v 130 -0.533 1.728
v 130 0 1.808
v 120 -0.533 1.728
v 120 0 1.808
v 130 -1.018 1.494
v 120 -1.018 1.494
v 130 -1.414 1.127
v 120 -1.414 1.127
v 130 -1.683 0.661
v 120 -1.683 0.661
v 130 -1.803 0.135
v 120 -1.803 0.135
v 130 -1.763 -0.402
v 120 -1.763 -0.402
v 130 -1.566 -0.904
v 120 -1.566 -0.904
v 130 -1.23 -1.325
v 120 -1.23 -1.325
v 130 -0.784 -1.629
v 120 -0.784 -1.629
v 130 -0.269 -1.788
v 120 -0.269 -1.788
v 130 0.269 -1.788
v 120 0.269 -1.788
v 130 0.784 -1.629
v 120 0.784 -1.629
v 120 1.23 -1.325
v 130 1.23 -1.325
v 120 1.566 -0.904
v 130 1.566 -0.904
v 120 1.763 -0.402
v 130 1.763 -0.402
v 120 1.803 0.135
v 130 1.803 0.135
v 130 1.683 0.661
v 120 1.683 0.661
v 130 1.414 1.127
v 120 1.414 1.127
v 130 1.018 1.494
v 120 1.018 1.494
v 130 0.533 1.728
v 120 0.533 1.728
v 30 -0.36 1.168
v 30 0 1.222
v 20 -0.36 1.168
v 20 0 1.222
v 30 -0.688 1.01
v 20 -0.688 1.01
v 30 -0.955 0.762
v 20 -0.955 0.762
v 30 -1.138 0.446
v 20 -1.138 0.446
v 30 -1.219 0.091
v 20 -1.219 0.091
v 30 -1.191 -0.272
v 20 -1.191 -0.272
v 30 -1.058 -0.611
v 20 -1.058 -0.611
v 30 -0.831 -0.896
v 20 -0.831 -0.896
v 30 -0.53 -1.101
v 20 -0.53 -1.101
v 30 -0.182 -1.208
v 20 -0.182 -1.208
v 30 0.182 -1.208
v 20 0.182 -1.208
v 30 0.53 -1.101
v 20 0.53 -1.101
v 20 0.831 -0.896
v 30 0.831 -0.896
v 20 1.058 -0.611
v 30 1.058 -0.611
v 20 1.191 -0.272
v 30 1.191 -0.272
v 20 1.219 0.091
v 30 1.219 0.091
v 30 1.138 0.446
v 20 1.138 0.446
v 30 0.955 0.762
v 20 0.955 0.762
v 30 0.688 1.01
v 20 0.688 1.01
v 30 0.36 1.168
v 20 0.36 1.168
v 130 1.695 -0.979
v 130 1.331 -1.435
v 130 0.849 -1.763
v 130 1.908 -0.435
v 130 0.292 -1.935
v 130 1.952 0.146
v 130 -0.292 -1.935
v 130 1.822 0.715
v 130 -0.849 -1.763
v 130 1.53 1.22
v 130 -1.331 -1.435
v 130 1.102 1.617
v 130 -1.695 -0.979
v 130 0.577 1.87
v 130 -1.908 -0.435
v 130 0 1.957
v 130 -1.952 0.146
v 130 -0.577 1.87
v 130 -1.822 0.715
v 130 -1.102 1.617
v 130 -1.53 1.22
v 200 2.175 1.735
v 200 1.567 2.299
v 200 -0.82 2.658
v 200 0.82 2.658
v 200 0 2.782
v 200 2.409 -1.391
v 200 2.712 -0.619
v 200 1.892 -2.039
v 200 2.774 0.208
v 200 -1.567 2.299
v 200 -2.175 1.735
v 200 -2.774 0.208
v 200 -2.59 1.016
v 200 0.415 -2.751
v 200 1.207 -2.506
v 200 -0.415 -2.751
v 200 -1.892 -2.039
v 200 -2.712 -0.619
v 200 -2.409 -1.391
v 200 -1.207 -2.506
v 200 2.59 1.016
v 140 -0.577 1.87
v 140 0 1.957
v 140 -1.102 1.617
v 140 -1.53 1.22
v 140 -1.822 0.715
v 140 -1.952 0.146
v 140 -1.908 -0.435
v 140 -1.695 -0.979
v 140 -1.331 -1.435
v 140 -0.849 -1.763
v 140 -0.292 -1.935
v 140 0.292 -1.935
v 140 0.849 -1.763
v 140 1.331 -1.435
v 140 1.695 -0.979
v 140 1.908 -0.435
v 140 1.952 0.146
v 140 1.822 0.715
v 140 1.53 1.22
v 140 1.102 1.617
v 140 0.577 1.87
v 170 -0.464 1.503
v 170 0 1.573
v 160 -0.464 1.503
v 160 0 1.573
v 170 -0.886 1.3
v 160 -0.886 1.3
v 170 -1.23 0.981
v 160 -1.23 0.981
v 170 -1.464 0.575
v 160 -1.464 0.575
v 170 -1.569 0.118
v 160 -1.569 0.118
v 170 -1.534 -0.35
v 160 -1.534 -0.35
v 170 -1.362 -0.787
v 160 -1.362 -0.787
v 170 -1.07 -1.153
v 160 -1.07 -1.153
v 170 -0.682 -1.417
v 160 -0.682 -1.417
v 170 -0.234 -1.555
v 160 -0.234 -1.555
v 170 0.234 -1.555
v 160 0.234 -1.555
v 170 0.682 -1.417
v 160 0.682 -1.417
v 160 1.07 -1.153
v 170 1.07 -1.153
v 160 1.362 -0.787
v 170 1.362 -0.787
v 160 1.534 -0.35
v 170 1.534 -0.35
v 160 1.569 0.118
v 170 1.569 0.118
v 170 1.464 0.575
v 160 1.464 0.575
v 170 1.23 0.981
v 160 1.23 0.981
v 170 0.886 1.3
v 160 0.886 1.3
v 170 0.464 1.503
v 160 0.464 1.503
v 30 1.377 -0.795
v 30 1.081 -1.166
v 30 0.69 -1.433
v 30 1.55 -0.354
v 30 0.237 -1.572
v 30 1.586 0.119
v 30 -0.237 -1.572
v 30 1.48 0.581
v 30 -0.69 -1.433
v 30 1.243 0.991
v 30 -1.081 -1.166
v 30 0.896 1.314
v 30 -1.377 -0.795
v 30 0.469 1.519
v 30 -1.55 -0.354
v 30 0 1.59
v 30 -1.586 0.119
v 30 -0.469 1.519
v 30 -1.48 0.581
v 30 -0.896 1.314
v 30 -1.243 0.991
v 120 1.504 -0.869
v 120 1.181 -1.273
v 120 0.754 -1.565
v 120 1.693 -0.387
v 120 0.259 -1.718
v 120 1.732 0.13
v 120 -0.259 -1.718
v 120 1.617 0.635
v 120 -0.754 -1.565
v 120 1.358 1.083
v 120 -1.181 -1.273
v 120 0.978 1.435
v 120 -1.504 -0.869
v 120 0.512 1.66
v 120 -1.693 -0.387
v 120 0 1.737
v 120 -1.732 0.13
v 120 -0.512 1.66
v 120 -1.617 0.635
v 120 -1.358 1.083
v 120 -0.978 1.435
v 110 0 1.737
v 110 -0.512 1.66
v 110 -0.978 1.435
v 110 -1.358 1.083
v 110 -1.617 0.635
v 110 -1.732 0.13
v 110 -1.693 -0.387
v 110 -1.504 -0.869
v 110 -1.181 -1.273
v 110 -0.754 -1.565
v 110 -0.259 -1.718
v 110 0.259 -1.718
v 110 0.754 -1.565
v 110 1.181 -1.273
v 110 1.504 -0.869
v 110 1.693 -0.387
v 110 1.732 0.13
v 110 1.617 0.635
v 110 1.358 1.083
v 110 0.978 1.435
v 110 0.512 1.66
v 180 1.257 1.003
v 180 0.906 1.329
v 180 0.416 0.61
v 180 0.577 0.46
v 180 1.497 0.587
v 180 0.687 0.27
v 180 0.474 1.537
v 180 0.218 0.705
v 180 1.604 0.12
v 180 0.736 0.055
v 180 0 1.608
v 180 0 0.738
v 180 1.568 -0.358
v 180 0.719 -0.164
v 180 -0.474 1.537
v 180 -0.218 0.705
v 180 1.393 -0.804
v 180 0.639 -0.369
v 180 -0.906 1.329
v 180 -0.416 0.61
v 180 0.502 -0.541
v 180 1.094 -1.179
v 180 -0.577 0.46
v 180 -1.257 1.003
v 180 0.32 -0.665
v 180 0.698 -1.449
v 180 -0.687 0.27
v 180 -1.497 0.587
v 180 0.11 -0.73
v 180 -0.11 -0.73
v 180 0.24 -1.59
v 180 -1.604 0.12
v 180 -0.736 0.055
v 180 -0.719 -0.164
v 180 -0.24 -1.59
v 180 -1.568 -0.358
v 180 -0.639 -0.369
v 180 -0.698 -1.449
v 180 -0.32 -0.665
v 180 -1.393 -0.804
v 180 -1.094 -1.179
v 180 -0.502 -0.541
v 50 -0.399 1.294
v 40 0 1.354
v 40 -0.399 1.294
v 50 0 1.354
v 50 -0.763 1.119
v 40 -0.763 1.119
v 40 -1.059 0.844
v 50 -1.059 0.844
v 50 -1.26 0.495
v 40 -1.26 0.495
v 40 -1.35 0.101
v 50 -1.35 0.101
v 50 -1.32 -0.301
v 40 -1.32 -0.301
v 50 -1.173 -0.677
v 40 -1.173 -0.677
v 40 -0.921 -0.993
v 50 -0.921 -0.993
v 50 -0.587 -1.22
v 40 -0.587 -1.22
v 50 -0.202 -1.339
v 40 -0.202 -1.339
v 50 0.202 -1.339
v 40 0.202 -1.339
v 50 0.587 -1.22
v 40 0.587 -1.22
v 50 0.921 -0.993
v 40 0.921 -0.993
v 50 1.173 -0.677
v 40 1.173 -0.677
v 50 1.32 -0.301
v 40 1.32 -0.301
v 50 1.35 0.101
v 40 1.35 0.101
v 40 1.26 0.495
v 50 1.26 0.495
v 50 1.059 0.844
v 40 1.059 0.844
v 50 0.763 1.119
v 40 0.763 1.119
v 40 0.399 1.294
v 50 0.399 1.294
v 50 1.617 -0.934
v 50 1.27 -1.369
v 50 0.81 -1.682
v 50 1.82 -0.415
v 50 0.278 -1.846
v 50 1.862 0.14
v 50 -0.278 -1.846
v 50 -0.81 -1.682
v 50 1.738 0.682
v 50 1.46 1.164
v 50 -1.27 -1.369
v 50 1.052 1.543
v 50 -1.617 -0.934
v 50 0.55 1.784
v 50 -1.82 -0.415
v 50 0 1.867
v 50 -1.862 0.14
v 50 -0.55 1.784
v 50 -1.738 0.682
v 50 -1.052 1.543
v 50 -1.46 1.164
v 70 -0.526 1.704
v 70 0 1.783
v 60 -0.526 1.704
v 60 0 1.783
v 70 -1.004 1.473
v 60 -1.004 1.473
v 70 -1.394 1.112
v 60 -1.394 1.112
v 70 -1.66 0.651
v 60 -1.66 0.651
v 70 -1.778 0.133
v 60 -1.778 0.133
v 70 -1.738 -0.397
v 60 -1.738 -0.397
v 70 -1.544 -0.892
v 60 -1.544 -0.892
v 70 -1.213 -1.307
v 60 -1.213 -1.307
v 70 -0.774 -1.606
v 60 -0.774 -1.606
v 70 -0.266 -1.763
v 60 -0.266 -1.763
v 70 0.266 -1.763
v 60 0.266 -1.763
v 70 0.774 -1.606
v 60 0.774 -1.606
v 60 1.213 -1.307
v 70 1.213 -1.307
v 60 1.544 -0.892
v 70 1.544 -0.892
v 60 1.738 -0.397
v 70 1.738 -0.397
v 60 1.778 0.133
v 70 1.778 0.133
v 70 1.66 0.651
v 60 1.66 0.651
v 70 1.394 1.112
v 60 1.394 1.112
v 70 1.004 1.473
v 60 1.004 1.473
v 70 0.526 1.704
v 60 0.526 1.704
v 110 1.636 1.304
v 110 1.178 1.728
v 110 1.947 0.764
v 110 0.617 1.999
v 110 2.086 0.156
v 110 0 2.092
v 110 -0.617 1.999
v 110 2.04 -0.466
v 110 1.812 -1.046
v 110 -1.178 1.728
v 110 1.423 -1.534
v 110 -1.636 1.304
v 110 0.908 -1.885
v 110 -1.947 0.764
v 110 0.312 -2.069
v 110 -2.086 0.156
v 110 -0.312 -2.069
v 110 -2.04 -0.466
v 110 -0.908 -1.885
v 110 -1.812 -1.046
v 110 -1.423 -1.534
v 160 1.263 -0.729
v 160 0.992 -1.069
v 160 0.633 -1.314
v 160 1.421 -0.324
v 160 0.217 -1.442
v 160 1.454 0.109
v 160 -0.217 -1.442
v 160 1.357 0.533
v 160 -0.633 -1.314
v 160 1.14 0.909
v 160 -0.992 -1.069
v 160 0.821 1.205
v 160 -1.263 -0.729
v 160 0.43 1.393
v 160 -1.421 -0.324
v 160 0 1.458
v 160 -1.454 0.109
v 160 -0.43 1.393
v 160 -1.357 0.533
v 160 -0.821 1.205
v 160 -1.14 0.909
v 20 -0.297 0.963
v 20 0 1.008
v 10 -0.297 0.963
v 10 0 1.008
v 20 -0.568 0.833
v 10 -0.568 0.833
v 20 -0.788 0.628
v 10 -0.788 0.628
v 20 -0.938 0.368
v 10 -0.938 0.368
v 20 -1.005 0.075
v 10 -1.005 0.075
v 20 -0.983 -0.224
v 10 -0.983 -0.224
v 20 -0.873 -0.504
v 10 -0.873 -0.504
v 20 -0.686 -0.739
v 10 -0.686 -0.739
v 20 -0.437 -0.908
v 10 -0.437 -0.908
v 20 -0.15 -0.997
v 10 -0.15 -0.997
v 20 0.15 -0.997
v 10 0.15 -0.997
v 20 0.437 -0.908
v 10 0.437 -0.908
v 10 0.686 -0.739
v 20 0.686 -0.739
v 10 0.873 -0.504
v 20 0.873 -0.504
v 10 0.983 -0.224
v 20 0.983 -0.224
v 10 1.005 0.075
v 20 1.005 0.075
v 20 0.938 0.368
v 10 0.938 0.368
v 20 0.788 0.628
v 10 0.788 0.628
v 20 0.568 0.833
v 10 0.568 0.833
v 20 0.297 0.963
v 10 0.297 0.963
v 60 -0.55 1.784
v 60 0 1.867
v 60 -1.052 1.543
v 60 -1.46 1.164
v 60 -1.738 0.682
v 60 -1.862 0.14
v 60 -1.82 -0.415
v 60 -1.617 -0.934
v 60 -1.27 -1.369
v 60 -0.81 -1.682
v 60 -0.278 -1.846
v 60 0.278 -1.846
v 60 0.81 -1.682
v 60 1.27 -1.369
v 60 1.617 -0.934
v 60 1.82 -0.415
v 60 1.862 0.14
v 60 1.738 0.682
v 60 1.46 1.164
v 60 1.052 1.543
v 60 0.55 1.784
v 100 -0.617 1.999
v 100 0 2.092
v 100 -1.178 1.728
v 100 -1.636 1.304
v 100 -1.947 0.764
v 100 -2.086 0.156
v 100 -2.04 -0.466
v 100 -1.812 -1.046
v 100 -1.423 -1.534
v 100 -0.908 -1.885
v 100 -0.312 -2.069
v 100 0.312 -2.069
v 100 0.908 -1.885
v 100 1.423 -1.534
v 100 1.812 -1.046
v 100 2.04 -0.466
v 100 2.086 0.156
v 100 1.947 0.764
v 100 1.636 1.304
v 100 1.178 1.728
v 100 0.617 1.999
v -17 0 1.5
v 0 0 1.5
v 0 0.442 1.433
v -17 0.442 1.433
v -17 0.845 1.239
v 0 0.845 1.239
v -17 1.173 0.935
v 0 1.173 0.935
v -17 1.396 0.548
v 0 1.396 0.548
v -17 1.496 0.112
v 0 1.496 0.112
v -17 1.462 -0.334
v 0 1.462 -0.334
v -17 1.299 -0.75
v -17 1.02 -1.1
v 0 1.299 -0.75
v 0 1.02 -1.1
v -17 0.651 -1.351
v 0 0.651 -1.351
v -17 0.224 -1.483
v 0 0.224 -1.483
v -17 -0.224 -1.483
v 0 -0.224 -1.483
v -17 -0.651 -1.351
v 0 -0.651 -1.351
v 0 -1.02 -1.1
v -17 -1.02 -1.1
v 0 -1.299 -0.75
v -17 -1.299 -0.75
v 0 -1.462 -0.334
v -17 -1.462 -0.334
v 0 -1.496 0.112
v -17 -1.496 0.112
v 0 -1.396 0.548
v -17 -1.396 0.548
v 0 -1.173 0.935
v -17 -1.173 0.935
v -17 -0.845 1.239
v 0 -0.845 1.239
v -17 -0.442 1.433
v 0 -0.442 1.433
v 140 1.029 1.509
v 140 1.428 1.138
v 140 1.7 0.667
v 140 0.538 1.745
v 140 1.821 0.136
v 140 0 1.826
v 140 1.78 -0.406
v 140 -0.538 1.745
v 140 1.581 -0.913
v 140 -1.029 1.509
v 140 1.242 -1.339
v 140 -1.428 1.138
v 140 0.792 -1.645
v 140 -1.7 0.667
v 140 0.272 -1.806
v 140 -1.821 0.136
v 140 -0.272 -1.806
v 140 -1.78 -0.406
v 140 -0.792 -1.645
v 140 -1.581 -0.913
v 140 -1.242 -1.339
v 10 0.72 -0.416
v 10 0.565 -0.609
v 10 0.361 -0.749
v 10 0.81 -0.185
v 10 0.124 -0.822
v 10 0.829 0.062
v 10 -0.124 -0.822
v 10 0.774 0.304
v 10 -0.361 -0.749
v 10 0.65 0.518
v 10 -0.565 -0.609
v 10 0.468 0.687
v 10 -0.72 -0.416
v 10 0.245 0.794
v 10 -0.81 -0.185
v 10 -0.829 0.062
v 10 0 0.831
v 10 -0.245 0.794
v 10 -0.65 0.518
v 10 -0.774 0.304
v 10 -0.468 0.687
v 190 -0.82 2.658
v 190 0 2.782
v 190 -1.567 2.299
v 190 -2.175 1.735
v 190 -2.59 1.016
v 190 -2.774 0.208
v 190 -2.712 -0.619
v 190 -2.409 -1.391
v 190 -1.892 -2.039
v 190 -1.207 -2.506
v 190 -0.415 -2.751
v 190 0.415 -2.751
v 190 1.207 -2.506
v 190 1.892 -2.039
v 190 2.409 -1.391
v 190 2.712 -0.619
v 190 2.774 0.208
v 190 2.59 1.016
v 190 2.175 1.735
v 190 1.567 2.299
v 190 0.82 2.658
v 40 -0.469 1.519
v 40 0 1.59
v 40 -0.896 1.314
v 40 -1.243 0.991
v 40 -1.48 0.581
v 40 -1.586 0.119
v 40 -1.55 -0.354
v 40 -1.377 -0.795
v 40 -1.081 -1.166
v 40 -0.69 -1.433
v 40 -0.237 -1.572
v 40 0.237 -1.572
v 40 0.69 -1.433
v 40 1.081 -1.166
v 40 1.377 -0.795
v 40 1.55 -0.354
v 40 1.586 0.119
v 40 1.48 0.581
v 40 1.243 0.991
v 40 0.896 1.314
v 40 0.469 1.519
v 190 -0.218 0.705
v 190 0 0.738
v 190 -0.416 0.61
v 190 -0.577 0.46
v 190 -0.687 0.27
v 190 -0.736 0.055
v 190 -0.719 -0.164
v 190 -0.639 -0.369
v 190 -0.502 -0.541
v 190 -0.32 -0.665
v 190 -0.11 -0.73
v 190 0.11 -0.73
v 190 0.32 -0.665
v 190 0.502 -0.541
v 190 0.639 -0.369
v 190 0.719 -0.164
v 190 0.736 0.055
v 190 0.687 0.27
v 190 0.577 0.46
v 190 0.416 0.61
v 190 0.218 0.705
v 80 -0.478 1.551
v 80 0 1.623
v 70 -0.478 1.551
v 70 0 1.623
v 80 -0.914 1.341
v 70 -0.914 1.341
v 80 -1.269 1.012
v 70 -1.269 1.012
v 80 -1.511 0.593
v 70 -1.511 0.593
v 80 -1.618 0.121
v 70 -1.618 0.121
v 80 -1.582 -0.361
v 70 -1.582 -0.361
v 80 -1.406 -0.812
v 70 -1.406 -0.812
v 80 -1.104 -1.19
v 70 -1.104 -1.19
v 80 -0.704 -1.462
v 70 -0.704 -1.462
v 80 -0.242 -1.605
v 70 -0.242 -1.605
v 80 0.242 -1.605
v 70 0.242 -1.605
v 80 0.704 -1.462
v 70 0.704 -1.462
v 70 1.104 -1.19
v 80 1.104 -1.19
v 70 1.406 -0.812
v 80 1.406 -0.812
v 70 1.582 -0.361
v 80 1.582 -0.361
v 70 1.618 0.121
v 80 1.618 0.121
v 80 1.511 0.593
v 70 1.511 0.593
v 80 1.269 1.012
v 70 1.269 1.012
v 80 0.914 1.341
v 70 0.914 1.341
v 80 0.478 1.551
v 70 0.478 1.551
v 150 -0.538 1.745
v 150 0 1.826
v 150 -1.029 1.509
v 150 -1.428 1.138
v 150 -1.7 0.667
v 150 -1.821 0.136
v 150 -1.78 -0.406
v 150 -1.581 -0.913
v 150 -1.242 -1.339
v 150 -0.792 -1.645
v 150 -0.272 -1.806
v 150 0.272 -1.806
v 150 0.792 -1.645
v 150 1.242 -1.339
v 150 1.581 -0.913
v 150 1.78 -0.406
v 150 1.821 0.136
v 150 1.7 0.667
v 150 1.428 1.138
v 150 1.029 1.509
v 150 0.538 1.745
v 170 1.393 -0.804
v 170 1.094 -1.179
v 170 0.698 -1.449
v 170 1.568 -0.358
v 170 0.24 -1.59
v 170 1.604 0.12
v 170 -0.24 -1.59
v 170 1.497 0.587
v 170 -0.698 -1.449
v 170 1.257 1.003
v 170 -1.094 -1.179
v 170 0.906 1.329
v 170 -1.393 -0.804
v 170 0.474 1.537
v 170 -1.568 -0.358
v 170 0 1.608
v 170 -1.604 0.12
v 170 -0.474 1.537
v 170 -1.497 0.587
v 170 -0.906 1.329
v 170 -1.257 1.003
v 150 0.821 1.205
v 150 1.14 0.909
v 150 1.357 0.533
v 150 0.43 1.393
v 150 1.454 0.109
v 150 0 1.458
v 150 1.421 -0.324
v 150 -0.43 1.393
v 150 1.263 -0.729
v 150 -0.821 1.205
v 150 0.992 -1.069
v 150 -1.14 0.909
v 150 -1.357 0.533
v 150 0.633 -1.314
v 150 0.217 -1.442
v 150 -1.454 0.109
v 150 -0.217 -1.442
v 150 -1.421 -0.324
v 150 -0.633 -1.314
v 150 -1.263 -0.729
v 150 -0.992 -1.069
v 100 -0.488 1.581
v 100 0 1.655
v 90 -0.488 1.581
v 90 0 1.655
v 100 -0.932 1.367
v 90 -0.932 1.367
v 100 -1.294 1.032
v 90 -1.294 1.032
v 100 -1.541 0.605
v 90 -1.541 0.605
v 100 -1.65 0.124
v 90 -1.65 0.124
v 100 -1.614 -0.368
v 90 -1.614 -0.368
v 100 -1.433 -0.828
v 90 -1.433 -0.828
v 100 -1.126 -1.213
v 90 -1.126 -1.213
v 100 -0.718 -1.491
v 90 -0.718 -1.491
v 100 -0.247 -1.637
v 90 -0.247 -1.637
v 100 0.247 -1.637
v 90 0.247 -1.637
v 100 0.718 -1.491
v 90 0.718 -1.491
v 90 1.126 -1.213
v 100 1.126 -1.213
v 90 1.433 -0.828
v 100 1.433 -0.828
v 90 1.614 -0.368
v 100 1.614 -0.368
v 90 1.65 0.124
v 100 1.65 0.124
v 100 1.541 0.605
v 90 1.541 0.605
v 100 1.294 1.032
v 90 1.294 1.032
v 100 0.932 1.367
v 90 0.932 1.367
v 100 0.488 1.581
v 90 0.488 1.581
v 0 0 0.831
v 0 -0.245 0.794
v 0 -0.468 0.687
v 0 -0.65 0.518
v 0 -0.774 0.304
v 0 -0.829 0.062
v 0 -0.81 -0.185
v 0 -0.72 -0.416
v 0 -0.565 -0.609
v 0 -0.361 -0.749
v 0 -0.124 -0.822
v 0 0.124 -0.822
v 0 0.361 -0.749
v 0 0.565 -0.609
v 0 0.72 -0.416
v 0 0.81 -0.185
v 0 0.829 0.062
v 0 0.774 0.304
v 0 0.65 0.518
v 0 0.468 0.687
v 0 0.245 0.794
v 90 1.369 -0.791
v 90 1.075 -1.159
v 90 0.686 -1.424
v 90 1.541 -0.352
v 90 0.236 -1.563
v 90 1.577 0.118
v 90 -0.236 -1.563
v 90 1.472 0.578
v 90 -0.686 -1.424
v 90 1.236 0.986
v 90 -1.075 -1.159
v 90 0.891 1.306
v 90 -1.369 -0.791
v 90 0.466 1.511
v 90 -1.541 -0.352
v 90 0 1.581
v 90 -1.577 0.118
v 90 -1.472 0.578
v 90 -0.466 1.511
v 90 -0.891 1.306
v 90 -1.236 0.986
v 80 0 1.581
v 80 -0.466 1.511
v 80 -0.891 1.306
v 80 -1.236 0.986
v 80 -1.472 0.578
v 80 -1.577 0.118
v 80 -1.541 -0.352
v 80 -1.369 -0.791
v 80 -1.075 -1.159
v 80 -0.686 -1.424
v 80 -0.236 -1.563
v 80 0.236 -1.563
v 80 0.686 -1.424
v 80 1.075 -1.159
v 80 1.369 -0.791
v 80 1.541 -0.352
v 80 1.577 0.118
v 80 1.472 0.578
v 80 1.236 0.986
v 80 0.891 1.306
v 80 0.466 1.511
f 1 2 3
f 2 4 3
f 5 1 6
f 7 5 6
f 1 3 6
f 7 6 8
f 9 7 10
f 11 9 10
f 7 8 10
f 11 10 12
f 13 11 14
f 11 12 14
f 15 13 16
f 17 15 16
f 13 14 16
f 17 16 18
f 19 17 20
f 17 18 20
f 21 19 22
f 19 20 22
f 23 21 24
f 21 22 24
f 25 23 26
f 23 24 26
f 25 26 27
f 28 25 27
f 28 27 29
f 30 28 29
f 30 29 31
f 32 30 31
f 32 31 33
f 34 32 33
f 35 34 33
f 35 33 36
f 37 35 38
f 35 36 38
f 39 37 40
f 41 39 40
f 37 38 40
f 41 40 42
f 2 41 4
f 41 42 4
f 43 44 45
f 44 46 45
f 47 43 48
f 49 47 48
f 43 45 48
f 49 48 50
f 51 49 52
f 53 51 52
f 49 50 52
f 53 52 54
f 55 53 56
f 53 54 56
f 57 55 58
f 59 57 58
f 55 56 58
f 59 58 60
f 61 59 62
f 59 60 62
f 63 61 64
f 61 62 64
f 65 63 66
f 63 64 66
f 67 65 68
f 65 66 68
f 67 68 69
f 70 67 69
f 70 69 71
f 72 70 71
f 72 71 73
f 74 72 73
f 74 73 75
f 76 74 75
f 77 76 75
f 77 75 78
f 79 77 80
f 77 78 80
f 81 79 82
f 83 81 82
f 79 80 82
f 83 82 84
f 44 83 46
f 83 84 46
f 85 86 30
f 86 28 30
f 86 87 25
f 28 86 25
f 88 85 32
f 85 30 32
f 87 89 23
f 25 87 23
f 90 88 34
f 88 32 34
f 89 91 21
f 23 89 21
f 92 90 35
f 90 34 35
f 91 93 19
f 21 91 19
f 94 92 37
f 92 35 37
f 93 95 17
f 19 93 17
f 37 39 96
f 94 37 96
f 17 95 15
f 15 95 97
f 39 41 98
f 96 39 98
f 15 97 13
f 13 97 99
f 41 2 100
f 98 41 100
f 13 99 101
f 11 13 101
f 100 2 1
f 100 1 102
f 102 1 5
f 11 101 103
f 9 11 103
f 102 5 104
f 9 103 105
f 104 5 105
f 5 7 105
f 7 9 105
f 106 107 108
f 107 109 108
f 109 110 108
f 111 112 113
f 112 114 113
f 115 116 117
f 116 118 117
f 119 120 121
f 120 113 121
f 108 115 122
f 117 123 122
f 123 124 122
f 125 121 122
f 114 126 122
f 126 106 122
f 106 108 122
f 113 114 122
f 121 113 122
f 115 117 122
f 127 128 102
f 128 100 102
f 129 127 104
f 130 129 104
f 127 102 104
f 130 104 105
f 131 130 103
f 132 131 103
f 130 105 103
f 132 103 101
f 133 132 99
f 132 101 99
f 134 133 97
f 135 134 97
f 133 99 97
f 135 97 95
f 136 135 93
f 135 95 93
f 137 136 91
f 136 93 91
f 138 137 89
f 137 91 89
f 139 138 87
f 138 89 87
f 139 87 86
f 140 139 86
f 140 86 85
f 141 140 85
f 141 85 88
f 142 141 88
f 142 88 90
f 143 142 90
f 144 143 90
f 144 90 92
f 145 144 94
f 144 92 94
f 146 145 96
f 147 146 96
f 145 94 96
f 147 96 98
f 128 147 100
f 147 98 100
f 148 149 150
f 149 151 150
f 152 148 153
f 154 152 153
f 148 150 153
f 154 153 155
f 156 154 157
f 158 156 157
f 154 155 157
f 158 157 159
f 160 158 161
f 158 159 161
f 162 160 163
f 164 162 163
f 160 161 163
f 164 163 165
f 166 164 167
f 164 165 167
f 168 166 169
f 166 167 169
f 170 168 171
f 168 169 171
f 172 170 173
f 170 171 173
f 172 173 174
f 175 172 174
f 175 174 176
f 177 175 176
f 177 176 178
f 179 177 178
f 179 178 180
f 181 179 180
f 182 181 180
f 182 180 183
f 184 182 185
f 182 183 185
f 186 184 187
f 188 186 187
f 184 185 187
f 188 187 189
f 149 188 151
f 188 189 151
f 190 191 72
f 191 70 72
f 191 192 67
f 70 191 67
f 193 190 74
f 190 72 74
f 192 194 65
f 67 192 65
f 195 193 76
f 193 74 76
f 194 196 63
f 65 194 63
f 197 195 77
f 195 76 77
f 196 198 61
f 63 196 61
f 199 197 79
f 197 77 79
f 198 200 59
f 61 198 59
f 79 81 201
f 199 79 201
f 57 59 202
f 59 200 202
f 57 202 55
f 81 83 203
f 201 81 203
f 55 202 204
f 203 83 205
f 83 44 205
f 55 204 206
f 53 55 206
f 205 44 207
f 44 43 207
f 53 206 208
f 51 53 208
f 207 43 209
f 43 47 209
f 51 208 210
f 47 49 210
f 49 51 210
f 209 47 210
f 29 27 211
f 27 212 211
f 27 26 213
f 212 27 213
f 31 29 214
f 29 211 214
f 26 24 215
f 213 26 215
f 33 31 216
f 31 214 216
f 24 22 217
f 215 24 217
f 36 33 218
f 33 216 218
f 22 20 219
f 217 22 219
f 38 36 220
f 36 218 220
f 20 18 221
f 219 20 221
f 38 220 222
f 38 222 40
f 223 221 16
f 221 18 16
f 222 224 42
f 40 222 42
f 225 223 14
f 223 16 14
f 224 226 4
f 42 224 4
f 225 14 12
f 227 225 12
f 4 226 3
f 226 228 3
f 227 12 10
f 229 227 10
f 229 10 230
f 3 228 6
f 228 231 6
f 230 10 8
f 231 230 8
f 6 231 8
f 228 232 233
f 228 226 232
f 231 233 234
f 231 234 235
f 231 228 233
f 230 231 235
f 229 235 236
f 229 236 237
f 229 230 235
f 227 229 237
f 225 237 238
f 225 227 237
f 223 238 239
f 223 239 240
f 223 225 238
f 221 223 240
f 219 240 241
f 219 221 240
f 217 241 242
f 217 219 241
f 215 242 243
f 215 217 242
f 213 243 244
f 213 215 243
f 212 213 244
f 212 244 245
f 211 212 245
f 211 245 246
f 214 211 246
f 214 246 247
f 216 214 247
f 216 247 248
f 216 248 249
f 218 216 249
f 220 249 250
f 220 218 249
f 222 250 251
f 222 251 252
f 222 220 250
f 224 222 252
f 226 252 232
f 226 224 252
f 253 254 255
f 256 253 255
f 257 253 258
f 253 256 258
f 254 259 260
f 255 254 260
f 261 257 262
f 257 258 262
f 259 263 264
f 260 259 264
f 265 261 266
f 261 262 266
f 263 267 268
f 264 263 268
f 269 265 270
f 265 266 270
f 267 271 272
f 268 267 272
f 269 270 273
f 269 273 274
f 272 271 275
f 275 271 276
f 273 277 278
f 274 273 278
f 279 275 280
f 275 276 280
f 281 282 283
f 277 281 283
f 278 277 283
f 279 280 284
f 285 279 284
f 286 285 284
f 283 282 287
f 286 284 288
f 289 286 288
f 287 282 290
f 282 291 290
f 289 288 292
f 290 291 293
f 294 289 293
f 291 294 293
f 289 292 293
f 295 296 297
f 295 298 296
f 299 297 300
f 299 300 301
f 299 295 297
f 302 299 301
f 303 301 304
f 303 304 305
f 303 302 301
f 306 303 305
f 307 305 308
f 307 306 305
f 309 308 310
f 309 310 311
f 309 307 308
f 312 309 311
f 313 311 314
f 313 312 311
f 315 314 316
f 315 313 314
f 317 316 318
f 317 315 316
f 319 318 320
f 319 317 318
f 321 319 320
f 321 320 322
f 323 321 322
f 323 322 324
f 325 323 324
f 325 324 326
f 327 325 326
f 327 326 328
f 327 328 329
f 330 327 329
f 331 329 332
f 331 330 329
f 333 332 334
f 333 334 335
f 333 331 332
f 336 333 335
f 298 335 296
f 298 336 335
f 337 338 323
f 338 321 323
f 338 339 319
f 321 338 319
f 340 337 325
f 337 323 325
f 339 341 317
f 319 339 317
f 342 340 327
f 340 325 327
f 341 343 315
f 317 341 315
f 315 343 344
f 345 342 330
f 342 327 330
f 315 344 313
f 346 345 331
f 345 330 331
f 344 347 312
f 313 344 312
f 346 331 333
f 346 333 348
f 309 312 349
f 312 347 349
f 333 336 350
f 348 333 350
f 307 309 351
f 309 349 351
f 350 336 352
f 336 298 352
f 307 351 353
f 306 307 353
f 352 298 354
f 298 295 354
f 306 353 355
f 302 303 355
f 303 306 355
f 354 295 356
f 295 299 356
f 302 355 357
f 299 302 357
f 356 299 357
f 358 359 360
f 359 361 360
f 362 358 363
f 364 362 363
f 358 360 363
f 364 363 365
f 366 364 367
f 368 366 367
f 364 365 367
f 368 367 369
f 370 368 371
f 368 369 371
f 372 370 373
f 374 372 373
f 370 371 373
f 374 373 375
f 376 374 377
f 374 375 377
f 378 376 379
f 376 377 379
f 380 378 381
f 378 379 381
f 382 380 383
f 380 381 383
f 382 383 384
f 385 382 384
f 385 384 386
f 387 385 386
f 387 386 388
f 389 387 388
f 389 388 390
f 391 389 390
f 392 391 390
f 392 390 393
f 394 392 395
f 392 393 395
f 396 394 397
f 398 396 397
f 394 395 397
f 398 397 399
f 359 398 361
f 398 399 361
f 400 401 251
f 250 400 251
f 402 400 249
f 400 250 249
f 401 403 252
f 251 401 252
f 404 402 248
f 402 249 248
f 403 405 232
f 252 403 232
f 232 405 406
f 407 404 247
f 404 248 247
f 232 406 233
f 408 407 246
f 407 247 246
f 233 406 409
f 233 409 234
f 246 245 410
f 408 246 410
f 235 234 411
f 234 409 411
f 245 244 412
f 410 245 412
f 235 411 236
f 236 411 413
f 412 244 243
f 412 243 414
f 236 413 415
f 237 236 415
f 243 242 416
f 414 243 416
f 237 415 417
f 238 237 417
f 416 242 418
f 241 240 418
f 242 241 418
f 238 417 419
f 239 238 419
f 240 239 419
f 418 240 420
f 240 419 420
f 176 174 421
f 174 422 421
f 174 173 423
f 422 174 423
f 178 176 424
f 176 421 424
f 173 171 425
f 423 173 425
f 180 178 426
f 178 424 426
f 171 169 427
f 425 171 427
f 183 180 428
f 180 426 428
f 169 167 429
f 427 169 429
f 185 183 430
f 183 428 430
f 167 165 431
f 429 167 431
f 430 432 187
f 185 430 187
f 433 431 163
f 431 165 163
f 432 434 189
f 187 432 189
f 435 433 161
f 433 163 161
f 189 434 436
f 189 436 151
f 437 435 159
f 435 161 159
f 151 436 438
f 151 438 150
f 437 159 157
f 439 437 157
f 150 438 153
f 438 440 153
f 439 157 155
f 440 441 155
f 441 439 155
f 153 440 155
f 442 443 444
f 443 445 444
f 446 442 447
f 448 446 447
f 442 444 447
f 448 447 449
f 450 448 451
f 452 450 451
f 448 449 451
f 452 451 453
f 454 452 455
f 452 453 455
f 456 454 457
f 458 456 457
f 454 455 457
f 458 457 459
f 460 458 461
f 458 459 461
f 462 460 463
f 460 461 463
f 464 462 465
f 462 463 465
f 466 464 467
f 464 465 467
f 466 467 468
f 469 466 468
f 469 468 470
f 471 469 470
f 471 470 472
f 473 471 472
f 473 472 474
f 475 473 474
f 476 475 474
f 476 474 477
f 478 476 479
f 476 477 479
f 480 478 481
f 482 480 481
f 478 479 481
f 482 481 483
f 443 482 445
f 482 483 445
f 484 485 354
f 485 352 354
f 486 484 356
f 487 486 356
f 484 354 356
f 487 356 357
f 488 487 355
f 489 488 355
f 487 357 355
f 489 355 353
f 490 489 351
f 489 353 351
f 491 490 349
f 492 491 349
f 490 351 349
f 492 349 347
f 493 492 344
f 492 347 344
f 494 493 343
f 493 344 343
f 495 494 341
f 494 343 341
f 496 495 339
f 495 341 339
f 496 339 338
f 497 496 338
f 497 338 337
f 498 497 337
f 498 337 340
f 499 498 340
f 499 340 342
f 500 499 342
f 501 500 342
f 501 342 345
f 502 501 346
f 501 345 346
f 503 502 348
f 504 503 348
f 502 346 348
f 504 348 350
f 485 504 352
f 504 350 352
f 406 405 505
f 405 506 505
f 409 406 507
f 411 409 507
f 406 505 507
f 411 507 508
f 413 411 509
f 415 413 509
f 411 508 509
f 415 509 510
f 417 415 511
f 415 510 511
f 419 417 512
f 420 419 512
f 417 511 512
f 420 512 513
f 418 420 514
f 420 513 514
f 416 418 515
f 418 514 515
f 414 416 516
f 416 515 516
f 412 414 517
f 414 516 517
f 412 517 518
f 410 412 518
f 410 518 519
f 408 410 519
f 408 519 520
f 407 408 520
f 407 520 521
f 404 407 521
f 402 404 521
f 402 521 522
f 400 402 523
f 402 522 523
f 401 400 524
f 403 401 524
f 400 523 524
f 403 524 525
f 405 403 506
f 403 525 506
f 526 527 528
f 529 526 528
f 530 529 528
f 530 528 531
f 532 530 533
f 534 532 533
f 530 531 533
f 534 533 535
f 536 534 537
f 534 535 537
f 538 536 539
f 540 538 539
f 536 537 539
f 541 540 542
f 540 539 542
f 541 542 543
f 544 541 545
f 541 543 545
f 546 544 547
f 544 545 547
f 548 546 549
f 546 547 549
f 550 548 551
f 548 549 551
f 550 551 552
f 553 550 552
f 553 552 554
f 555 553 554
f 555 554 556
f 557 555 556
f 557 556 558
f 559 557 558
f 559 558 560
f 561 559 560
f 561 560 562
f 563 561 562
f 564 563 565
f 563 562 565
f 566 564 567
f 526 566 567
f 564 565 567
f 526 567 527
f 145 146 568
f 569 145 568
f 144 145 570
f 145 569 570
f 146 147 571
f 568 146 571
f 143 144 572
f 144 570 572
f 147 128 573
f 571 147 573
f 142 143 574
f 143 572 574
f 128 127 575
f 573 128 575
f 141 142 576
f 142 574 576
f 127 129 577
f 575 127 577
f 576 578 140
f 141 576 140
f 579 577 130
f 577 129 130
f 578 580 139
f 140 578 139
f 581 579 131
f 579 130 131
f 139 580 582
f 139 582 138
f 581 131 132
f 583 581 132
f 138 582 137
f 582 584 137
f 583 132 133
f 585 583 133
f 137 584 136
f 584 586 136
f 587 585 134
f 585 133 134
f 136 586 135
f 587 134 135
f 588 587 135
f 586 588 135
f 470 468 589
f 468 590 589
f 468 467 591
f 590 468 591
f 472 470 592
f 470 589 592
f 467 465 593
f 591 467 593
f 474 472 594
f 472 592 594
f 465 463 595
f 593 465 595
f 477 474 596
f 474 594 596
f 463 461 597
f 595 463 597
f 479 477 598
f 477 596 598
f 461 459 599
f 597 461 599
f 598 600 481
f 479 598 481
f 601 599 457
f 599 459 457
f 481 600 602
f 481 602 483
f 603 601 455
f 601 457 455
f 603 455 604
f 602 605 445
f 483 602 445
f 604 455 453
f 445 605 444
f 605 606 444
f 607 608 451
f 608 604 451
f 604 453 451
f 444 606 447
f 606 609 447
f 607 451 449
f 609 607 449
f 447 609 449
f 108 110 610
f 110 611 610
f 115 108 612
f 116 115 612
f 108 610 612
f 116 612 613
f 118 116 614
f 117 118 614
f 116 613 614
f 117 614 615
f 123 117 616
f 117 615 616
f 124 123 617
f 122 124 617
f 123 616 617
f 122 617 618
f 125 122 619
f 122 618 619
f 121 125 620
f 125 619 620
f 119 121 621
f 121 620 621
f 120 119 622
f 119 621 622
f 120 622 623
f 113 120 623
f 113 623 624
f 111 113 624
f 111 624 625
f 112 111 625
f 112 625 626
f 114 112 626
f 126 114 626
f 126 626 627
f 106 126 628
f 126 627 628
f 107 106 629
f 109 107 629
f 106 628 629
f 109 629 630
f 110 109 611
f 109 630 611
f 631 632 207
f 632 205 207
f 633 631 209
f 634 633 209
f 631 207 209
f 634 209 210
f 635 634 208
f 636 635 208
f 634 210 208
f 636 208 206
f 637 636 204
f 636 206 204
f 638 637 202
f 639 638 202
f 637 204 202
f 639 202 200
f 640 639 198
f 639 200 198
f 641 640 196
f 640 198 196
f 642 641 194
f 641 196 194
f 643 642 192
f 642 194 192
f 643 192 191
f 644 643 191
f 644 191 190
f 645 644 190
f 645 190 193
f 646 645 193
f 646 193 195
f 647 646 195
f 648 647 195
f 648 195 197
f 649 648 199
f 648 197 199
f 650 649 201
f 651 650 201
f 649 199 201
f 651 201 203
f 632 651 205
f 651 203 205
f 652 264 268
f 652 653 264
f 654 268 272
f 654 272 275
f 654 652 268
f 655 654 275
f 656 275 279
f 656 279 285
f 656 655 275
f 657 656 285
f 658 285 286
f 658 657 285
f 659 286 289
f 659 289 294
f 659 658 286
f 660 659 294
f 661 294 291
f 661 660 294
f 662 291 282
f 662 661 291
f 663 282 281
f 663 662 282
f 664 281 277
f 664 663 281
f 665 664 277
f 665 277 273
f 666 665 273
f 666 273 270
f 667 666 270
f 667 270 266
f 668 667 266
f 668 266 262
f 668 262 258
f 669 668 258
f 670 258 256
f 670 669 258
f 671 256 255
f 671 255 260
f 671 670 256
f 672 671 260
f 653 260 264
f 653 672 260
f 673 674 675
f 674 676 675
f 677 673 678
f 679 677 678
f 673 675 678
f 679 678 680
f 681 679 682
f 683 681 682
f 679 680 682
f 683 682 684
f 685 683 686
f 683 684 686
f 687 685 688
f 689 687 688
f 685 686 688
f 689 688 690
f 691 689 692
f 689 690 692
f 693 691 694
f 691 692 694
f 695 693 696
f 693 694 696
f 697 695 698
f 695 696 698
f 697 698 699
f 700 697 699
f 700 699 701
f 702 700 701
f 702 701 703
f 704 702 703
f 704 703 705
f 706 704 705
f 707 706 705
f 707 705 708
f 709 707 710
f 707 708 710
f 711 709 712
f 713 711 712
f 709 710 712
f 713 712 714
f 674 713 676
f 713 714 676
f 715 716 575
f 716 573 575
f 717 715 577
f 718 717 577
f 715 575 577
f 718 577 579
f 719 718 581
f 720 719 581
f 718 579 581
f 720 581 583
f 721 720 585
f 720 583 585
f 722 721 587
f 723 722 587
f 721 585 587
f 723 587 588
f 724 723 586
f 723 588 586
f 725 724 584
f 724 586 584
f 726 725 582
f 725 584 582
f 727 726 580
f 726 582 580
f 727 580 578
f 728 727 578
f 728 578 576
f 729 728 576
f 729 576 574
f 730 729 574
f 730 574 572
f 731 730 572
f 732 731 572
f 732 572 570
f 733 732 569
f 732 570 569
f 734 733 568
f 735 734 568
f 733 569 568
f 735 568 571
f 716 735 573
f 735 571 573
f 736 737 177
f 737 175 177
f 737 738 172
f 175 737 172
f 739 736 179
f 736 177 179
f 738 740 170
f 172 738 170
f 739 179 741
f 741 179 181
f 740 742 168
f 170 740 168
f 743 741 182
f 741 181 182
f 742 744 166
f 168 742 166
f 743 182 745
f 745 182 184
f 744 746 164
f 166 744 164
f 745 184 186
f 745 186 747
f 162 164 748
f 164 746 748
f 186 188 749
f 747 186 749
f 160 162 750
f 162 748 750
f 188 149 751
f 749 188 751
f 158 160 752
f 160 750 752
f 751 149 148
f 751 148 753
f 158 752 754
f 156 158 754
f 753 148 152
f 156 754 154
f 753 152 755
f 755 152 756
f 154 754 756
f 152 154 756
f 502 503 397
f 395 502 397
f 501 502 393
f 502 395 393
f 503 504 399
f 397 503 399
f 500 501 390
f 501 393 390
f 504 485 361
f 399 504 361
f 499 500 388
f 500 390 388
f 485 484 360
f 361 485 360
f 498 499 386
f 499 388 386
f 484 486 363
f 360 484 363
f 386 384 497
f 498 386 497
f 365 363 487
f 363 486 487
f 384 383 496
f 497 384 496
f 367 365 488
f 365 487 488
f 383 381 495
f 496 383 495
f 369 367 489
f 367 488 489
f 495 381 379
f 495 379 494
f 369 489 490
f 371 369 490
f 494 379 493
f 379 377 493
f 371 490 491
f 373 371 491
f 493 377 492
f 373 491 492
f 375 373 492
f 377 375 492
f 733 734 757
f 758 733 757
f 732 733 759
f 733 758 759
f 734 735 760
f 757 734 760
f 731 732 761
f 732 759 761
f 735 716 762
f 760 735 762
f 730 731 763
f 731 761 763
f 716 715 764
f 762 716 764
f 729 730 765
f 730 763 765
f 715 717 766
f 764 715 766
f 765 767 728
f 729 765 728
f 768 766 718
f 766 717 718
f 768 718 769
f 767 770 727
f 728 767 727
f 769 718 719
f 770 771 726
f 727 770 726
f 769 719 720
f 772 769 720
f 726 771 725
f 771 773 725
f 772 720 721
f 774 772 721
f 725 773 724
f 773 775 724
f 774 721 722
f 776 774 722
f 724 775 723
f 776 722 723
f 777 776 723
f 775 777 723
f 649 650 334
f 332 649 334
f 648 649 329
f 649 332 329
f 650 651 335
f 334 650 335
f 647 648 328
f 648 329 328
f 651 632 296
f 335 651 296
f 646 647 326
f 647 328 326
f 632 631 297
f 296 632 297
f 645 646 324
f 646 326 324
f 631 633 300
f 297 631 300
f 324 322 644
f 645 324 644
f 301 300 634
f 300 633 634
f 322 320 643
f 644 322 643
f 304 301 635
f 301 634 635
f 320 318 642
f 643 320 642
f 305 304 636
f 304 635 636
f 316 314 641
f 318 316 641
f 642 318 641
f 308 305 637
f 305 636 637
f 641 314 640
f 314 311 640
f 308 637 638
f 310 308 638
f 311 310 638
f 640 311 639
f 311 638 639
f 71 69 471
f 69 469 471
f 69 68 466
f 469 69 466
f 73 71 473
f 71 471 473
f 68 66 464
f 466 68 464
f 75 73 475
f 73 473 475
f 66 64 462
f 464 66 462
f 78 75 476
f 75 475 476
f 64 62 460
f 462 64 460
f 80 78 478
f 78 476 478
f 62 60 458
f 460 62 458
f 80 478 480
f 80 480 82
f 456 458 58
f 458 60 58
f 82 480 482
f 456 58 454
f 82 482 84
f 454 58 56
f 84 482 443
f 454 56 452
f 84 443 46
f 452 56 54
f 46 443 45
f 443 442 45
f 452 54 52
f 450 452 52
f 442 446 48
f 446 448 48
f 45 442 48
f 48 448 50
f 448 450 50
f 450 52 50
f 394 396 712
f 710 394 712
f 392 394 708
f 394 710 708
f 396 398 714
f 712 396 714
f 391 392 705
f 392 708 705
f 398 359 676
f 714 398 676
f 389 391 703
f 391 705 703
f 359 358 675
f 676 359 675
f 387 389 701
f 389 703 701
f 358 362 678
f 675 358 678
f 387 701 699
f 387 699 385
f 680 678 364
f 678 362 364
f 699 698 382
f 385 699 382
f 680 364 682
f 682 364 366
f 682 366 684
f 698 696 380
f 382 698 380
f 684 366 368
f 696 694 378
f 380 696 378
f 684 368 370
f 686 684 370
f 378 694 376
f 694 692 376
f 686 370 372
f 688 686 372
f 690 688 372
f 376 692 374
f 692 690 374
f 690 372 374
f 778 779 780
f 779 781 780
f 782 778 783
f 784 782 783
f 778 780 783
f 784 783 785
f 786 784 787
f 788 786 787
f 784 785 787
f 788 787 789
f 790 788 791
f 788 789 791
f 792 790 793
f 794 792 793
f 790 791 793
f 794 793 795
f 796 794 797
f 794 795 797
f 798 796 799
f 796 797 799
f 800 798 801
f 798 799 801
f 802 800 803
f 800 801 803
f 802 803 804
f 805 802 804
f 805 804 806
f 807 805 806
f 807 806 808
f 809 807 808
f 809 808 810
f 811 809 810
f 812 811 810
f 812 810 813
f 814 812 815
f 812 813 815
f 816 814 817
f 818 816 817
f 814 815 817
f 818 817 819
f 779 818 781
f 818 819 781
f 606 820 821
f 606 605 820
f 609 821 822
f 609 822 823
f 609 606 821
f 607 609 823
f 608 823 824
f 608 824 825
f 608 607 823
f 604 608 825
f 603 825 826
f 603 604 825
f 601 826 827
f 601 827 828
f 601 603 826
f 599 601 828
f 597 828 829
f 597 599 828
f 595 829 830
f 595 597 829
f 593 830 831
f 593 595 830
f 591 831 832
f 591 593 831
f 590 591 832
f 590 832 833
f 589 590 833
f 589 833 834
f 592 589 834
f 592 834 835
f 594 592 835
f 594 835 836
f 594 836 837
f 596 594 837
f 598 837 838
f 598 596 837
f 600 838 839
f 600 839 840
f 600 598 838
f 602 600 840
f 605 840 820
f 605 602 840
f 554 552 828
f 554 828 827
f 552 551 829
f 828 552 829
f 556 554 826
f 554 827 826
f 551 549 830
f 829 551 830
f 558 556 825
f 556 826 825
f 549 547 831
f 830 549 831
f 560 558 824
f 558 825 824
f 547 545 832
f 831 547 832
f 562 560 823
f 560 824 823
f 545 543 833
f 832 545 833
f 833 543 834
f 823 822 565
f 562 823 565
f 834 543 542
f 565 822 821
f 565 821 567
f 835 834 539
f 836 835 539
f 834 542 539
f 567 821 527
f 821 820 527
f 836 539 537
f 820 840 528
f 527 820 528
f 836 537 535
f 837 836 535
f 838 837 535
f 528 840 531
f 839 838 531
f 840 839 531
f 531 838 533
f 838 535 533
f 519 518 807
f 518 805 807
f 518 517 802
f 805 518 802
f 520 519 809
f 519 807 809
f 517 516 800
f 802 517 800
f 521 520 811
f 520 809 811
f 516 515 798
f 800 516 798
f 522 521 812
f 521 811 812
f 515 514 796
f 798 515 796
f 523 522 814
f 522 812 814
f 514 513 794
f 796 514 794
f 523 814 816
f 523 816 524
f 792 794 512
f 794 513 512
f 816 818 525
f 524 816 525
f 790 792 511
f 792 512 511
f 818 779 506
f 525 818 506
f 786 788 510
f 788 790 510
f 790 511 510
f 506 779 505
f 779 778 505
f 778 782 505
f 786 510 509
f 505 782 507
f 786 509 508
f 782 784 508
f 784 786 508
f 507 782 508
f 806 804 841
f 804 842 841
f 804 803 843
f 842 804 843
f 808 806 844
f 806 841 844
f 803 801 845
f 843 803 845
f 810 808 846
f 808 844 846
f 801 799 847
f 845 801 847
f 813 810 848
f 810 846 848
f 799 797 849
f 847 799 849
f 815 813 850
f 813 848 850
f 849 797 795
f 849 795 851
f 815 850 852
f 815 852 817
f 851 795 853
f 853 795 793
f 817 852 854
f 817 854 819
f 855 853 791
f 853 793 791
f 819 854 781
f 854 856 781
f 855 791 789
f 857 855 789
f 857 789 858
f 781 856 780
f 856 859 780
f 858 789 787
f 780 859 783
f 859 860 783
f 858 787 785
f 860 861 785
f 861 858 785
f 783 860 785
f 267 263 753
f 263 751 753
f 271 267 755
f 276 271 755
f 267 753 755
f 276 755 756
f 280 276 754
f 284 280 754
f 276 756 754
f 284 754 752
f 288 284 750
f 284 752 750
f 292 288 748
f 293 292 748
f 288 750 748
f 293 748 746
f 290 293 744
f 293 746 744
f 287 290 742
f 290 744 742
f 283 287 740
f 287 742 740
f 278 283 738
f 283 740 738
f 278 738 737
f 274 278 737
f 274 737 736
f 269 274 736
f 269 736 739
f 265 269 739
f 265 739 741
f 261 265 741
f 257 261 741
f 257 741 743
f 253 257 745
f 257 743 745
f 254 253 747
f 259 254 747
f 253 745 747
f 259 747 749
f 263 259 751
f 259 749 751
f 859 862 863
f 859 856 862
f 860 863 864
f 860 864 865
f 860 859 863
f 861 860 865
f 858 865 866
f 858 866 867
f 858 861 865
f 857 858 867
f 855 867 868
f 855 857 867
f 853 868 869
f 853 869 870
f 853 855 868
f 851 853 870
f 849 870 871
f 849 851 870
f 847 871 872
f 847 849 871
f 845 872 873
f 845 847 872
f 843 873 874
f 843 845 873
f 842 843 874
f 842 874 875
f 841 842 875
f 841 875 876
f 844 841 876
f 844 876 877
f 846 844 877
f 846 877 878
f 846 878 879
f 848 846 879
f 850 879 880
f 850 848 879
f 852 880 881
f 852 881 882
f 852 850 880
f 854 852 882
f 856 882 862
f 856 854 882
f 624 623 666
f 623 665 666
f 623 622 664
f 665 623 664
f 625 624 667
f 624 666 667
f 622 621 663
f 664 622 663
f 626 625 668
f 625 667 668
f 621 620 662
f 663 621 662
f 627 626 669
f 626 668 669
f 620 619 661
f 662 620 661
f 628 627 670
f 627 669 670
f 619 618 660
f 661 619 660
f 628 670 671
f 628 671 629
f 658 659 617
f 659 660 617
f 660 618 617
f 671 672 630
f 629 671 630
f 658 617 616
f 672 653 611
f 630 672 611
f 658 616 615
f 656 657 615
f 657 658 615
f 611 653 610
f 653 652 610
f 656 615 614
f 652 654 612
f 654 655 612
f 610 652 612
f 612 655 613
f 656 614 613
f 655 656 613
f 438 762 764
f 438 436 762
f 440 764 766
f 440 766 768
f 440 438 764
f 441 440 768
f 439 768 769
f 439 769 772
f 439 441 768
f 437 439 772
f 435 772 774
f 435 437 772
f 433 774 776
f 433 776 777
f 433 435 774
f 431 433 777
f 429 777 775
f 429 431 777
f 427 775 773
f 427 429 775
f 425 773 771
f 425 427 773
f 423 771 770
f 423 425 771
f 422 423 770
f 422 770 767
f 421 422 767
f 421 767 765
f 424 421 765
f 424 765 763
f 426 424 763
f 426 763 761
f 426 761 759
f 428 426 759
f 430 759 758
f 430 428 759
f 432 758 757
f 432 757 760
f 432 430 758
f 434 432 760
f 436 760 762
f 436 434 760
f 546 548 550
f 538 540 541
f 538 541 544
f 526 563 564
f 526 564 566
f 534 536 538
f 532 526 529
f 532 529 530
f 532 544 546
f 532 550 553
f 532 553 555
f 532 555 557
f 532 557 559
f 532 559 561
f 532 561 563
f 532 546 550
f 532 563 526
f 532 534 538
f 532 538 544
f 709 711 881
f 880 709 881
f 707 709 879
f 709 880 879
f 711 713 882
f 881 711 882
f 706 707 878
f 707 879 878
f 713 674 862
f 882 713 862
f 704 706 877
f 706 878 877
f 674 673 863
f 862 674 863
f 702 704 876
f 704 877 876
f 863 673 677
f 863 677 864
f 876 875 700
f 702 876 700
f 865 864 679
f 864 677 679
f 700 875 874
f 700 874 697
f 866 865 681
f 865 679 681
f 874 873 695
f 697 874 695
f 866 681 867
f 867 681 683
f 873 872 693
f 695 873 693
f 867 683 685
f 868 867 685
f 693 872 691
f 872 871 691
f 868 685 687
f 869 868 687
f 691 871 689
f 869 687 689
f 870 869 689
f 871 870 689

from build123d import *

# Parameters (mm, degrees)
SKETCH1_W           = 10
SKETCH1_H           = 0.831
SKETCH1_H_2         = 1.354
SKETCH1_H_3         = 1.581
SKETCH1_H_4         = 1.737
SKETCH1_H_5         = 1.458
SKETCH1_H_6         = 0.738
SKETCH2_R           = 1.5
BOSS_EXTRUDE1_DEPTH = 17


with BuildPart() as part:
    # Sketch1 → Revolve1 (revolve)
    with BuildSketch(Plane.XY, mode=Mode.PRIVATE) as revolve1_sk:
        with Locations((5, 0.4155)):
            Rectangle(SKETCH1_W, SKETCH1_H)
        Polygon((10, 0.831), (10, 0), (20, 0), (20, 1.008), (10, 1.008), align=None)
        Polygon((20, 1.008), (20, 0), (30, 0), (30, 1.222), (20, 1.222), align=None)
        Polygon((30, 1.222), (30, 0), (40, 0), (40, 1.354), (40, 1.59), (30, 1.59), align=None)
        with Locations((45, 0.677)):
            Rectangle(SKETCH1_W, SKETCH1_H_2)
        Polygon((50, 1.354), (50, 0), (60, 0), (60, 1.783), (60, 1.867), (50, 1.867), align=None)
        Polygon((60, 1.783), (60, 0), (70, 0), (70, 1.623), (70, 1.783), align=None)
        Polygon((70, 1.623), (70, 0), (80, 0), (80, 1.581), (80, 1.623), align=None)
        with Locations((85, 0.7905)):
            Rectangle(SKETCH1_W, SKETCH1_H_3)
        Polygon((90, 1.581), (90, 0), (100, 0), (100, 1.655), (90, 1.655), align=None)
        Polygon((100, 1.655), (100, 0), (110, 0), (110, 1.737), (110, 2.092), (100, 2.092), align=None)
        with Locations((115, 0.8685)):
            Rectangle(SKETCH1_W, SKETCH1_H_4)
        Polygon((120, 1.737), (120, 0), (130, 0), (130, 1.808), (120, 1.808), align=None)
        Polygon((130, 1.808), (130, 0), (140, 0), (140, 1.826), (140, 1.957), (130, 1.957), align=None)
        Polygon((140, 1.826), (140, 0), (150, 0), (150, 1.458), (150, 1.826), align=None)
        with Locations((155, 0.729)):
            Rectangle(SKETCH1_W, SKETCH1_H_5)
        Polygon((160, 1.458), (160, 0), (170, 0), (170, 1.573), (160, 1.573), align=None)
        Polygon((170, 1.573), (170, 0), (180, 0), (180, 0.738), (180, 1.608), (170, 1.608), align=None)
        with Locations((185, 0.369)):
            Rectangle(SKETCH1_W, SKETCH1_H_6)
        Polygon((190, 0.738), (190, 0), (200, 0), (200, 2.782), (190, 2.782), align=None)
    revolve(revolve1_sk.sketch.rotate(Axis((0, 0, 0), (1, 0, 0)), 90), axis=Axis((0, 0, 0), (1, 0, 0)))

    # Sketch2 → Boss-Extrude1 (add)
    with BuildSketch(Plane.ZY):
        Circle(SKETCH2_R)
    extrude(amount=BOSS_EXTRUDE1_DEPTH)


solid = part.part
